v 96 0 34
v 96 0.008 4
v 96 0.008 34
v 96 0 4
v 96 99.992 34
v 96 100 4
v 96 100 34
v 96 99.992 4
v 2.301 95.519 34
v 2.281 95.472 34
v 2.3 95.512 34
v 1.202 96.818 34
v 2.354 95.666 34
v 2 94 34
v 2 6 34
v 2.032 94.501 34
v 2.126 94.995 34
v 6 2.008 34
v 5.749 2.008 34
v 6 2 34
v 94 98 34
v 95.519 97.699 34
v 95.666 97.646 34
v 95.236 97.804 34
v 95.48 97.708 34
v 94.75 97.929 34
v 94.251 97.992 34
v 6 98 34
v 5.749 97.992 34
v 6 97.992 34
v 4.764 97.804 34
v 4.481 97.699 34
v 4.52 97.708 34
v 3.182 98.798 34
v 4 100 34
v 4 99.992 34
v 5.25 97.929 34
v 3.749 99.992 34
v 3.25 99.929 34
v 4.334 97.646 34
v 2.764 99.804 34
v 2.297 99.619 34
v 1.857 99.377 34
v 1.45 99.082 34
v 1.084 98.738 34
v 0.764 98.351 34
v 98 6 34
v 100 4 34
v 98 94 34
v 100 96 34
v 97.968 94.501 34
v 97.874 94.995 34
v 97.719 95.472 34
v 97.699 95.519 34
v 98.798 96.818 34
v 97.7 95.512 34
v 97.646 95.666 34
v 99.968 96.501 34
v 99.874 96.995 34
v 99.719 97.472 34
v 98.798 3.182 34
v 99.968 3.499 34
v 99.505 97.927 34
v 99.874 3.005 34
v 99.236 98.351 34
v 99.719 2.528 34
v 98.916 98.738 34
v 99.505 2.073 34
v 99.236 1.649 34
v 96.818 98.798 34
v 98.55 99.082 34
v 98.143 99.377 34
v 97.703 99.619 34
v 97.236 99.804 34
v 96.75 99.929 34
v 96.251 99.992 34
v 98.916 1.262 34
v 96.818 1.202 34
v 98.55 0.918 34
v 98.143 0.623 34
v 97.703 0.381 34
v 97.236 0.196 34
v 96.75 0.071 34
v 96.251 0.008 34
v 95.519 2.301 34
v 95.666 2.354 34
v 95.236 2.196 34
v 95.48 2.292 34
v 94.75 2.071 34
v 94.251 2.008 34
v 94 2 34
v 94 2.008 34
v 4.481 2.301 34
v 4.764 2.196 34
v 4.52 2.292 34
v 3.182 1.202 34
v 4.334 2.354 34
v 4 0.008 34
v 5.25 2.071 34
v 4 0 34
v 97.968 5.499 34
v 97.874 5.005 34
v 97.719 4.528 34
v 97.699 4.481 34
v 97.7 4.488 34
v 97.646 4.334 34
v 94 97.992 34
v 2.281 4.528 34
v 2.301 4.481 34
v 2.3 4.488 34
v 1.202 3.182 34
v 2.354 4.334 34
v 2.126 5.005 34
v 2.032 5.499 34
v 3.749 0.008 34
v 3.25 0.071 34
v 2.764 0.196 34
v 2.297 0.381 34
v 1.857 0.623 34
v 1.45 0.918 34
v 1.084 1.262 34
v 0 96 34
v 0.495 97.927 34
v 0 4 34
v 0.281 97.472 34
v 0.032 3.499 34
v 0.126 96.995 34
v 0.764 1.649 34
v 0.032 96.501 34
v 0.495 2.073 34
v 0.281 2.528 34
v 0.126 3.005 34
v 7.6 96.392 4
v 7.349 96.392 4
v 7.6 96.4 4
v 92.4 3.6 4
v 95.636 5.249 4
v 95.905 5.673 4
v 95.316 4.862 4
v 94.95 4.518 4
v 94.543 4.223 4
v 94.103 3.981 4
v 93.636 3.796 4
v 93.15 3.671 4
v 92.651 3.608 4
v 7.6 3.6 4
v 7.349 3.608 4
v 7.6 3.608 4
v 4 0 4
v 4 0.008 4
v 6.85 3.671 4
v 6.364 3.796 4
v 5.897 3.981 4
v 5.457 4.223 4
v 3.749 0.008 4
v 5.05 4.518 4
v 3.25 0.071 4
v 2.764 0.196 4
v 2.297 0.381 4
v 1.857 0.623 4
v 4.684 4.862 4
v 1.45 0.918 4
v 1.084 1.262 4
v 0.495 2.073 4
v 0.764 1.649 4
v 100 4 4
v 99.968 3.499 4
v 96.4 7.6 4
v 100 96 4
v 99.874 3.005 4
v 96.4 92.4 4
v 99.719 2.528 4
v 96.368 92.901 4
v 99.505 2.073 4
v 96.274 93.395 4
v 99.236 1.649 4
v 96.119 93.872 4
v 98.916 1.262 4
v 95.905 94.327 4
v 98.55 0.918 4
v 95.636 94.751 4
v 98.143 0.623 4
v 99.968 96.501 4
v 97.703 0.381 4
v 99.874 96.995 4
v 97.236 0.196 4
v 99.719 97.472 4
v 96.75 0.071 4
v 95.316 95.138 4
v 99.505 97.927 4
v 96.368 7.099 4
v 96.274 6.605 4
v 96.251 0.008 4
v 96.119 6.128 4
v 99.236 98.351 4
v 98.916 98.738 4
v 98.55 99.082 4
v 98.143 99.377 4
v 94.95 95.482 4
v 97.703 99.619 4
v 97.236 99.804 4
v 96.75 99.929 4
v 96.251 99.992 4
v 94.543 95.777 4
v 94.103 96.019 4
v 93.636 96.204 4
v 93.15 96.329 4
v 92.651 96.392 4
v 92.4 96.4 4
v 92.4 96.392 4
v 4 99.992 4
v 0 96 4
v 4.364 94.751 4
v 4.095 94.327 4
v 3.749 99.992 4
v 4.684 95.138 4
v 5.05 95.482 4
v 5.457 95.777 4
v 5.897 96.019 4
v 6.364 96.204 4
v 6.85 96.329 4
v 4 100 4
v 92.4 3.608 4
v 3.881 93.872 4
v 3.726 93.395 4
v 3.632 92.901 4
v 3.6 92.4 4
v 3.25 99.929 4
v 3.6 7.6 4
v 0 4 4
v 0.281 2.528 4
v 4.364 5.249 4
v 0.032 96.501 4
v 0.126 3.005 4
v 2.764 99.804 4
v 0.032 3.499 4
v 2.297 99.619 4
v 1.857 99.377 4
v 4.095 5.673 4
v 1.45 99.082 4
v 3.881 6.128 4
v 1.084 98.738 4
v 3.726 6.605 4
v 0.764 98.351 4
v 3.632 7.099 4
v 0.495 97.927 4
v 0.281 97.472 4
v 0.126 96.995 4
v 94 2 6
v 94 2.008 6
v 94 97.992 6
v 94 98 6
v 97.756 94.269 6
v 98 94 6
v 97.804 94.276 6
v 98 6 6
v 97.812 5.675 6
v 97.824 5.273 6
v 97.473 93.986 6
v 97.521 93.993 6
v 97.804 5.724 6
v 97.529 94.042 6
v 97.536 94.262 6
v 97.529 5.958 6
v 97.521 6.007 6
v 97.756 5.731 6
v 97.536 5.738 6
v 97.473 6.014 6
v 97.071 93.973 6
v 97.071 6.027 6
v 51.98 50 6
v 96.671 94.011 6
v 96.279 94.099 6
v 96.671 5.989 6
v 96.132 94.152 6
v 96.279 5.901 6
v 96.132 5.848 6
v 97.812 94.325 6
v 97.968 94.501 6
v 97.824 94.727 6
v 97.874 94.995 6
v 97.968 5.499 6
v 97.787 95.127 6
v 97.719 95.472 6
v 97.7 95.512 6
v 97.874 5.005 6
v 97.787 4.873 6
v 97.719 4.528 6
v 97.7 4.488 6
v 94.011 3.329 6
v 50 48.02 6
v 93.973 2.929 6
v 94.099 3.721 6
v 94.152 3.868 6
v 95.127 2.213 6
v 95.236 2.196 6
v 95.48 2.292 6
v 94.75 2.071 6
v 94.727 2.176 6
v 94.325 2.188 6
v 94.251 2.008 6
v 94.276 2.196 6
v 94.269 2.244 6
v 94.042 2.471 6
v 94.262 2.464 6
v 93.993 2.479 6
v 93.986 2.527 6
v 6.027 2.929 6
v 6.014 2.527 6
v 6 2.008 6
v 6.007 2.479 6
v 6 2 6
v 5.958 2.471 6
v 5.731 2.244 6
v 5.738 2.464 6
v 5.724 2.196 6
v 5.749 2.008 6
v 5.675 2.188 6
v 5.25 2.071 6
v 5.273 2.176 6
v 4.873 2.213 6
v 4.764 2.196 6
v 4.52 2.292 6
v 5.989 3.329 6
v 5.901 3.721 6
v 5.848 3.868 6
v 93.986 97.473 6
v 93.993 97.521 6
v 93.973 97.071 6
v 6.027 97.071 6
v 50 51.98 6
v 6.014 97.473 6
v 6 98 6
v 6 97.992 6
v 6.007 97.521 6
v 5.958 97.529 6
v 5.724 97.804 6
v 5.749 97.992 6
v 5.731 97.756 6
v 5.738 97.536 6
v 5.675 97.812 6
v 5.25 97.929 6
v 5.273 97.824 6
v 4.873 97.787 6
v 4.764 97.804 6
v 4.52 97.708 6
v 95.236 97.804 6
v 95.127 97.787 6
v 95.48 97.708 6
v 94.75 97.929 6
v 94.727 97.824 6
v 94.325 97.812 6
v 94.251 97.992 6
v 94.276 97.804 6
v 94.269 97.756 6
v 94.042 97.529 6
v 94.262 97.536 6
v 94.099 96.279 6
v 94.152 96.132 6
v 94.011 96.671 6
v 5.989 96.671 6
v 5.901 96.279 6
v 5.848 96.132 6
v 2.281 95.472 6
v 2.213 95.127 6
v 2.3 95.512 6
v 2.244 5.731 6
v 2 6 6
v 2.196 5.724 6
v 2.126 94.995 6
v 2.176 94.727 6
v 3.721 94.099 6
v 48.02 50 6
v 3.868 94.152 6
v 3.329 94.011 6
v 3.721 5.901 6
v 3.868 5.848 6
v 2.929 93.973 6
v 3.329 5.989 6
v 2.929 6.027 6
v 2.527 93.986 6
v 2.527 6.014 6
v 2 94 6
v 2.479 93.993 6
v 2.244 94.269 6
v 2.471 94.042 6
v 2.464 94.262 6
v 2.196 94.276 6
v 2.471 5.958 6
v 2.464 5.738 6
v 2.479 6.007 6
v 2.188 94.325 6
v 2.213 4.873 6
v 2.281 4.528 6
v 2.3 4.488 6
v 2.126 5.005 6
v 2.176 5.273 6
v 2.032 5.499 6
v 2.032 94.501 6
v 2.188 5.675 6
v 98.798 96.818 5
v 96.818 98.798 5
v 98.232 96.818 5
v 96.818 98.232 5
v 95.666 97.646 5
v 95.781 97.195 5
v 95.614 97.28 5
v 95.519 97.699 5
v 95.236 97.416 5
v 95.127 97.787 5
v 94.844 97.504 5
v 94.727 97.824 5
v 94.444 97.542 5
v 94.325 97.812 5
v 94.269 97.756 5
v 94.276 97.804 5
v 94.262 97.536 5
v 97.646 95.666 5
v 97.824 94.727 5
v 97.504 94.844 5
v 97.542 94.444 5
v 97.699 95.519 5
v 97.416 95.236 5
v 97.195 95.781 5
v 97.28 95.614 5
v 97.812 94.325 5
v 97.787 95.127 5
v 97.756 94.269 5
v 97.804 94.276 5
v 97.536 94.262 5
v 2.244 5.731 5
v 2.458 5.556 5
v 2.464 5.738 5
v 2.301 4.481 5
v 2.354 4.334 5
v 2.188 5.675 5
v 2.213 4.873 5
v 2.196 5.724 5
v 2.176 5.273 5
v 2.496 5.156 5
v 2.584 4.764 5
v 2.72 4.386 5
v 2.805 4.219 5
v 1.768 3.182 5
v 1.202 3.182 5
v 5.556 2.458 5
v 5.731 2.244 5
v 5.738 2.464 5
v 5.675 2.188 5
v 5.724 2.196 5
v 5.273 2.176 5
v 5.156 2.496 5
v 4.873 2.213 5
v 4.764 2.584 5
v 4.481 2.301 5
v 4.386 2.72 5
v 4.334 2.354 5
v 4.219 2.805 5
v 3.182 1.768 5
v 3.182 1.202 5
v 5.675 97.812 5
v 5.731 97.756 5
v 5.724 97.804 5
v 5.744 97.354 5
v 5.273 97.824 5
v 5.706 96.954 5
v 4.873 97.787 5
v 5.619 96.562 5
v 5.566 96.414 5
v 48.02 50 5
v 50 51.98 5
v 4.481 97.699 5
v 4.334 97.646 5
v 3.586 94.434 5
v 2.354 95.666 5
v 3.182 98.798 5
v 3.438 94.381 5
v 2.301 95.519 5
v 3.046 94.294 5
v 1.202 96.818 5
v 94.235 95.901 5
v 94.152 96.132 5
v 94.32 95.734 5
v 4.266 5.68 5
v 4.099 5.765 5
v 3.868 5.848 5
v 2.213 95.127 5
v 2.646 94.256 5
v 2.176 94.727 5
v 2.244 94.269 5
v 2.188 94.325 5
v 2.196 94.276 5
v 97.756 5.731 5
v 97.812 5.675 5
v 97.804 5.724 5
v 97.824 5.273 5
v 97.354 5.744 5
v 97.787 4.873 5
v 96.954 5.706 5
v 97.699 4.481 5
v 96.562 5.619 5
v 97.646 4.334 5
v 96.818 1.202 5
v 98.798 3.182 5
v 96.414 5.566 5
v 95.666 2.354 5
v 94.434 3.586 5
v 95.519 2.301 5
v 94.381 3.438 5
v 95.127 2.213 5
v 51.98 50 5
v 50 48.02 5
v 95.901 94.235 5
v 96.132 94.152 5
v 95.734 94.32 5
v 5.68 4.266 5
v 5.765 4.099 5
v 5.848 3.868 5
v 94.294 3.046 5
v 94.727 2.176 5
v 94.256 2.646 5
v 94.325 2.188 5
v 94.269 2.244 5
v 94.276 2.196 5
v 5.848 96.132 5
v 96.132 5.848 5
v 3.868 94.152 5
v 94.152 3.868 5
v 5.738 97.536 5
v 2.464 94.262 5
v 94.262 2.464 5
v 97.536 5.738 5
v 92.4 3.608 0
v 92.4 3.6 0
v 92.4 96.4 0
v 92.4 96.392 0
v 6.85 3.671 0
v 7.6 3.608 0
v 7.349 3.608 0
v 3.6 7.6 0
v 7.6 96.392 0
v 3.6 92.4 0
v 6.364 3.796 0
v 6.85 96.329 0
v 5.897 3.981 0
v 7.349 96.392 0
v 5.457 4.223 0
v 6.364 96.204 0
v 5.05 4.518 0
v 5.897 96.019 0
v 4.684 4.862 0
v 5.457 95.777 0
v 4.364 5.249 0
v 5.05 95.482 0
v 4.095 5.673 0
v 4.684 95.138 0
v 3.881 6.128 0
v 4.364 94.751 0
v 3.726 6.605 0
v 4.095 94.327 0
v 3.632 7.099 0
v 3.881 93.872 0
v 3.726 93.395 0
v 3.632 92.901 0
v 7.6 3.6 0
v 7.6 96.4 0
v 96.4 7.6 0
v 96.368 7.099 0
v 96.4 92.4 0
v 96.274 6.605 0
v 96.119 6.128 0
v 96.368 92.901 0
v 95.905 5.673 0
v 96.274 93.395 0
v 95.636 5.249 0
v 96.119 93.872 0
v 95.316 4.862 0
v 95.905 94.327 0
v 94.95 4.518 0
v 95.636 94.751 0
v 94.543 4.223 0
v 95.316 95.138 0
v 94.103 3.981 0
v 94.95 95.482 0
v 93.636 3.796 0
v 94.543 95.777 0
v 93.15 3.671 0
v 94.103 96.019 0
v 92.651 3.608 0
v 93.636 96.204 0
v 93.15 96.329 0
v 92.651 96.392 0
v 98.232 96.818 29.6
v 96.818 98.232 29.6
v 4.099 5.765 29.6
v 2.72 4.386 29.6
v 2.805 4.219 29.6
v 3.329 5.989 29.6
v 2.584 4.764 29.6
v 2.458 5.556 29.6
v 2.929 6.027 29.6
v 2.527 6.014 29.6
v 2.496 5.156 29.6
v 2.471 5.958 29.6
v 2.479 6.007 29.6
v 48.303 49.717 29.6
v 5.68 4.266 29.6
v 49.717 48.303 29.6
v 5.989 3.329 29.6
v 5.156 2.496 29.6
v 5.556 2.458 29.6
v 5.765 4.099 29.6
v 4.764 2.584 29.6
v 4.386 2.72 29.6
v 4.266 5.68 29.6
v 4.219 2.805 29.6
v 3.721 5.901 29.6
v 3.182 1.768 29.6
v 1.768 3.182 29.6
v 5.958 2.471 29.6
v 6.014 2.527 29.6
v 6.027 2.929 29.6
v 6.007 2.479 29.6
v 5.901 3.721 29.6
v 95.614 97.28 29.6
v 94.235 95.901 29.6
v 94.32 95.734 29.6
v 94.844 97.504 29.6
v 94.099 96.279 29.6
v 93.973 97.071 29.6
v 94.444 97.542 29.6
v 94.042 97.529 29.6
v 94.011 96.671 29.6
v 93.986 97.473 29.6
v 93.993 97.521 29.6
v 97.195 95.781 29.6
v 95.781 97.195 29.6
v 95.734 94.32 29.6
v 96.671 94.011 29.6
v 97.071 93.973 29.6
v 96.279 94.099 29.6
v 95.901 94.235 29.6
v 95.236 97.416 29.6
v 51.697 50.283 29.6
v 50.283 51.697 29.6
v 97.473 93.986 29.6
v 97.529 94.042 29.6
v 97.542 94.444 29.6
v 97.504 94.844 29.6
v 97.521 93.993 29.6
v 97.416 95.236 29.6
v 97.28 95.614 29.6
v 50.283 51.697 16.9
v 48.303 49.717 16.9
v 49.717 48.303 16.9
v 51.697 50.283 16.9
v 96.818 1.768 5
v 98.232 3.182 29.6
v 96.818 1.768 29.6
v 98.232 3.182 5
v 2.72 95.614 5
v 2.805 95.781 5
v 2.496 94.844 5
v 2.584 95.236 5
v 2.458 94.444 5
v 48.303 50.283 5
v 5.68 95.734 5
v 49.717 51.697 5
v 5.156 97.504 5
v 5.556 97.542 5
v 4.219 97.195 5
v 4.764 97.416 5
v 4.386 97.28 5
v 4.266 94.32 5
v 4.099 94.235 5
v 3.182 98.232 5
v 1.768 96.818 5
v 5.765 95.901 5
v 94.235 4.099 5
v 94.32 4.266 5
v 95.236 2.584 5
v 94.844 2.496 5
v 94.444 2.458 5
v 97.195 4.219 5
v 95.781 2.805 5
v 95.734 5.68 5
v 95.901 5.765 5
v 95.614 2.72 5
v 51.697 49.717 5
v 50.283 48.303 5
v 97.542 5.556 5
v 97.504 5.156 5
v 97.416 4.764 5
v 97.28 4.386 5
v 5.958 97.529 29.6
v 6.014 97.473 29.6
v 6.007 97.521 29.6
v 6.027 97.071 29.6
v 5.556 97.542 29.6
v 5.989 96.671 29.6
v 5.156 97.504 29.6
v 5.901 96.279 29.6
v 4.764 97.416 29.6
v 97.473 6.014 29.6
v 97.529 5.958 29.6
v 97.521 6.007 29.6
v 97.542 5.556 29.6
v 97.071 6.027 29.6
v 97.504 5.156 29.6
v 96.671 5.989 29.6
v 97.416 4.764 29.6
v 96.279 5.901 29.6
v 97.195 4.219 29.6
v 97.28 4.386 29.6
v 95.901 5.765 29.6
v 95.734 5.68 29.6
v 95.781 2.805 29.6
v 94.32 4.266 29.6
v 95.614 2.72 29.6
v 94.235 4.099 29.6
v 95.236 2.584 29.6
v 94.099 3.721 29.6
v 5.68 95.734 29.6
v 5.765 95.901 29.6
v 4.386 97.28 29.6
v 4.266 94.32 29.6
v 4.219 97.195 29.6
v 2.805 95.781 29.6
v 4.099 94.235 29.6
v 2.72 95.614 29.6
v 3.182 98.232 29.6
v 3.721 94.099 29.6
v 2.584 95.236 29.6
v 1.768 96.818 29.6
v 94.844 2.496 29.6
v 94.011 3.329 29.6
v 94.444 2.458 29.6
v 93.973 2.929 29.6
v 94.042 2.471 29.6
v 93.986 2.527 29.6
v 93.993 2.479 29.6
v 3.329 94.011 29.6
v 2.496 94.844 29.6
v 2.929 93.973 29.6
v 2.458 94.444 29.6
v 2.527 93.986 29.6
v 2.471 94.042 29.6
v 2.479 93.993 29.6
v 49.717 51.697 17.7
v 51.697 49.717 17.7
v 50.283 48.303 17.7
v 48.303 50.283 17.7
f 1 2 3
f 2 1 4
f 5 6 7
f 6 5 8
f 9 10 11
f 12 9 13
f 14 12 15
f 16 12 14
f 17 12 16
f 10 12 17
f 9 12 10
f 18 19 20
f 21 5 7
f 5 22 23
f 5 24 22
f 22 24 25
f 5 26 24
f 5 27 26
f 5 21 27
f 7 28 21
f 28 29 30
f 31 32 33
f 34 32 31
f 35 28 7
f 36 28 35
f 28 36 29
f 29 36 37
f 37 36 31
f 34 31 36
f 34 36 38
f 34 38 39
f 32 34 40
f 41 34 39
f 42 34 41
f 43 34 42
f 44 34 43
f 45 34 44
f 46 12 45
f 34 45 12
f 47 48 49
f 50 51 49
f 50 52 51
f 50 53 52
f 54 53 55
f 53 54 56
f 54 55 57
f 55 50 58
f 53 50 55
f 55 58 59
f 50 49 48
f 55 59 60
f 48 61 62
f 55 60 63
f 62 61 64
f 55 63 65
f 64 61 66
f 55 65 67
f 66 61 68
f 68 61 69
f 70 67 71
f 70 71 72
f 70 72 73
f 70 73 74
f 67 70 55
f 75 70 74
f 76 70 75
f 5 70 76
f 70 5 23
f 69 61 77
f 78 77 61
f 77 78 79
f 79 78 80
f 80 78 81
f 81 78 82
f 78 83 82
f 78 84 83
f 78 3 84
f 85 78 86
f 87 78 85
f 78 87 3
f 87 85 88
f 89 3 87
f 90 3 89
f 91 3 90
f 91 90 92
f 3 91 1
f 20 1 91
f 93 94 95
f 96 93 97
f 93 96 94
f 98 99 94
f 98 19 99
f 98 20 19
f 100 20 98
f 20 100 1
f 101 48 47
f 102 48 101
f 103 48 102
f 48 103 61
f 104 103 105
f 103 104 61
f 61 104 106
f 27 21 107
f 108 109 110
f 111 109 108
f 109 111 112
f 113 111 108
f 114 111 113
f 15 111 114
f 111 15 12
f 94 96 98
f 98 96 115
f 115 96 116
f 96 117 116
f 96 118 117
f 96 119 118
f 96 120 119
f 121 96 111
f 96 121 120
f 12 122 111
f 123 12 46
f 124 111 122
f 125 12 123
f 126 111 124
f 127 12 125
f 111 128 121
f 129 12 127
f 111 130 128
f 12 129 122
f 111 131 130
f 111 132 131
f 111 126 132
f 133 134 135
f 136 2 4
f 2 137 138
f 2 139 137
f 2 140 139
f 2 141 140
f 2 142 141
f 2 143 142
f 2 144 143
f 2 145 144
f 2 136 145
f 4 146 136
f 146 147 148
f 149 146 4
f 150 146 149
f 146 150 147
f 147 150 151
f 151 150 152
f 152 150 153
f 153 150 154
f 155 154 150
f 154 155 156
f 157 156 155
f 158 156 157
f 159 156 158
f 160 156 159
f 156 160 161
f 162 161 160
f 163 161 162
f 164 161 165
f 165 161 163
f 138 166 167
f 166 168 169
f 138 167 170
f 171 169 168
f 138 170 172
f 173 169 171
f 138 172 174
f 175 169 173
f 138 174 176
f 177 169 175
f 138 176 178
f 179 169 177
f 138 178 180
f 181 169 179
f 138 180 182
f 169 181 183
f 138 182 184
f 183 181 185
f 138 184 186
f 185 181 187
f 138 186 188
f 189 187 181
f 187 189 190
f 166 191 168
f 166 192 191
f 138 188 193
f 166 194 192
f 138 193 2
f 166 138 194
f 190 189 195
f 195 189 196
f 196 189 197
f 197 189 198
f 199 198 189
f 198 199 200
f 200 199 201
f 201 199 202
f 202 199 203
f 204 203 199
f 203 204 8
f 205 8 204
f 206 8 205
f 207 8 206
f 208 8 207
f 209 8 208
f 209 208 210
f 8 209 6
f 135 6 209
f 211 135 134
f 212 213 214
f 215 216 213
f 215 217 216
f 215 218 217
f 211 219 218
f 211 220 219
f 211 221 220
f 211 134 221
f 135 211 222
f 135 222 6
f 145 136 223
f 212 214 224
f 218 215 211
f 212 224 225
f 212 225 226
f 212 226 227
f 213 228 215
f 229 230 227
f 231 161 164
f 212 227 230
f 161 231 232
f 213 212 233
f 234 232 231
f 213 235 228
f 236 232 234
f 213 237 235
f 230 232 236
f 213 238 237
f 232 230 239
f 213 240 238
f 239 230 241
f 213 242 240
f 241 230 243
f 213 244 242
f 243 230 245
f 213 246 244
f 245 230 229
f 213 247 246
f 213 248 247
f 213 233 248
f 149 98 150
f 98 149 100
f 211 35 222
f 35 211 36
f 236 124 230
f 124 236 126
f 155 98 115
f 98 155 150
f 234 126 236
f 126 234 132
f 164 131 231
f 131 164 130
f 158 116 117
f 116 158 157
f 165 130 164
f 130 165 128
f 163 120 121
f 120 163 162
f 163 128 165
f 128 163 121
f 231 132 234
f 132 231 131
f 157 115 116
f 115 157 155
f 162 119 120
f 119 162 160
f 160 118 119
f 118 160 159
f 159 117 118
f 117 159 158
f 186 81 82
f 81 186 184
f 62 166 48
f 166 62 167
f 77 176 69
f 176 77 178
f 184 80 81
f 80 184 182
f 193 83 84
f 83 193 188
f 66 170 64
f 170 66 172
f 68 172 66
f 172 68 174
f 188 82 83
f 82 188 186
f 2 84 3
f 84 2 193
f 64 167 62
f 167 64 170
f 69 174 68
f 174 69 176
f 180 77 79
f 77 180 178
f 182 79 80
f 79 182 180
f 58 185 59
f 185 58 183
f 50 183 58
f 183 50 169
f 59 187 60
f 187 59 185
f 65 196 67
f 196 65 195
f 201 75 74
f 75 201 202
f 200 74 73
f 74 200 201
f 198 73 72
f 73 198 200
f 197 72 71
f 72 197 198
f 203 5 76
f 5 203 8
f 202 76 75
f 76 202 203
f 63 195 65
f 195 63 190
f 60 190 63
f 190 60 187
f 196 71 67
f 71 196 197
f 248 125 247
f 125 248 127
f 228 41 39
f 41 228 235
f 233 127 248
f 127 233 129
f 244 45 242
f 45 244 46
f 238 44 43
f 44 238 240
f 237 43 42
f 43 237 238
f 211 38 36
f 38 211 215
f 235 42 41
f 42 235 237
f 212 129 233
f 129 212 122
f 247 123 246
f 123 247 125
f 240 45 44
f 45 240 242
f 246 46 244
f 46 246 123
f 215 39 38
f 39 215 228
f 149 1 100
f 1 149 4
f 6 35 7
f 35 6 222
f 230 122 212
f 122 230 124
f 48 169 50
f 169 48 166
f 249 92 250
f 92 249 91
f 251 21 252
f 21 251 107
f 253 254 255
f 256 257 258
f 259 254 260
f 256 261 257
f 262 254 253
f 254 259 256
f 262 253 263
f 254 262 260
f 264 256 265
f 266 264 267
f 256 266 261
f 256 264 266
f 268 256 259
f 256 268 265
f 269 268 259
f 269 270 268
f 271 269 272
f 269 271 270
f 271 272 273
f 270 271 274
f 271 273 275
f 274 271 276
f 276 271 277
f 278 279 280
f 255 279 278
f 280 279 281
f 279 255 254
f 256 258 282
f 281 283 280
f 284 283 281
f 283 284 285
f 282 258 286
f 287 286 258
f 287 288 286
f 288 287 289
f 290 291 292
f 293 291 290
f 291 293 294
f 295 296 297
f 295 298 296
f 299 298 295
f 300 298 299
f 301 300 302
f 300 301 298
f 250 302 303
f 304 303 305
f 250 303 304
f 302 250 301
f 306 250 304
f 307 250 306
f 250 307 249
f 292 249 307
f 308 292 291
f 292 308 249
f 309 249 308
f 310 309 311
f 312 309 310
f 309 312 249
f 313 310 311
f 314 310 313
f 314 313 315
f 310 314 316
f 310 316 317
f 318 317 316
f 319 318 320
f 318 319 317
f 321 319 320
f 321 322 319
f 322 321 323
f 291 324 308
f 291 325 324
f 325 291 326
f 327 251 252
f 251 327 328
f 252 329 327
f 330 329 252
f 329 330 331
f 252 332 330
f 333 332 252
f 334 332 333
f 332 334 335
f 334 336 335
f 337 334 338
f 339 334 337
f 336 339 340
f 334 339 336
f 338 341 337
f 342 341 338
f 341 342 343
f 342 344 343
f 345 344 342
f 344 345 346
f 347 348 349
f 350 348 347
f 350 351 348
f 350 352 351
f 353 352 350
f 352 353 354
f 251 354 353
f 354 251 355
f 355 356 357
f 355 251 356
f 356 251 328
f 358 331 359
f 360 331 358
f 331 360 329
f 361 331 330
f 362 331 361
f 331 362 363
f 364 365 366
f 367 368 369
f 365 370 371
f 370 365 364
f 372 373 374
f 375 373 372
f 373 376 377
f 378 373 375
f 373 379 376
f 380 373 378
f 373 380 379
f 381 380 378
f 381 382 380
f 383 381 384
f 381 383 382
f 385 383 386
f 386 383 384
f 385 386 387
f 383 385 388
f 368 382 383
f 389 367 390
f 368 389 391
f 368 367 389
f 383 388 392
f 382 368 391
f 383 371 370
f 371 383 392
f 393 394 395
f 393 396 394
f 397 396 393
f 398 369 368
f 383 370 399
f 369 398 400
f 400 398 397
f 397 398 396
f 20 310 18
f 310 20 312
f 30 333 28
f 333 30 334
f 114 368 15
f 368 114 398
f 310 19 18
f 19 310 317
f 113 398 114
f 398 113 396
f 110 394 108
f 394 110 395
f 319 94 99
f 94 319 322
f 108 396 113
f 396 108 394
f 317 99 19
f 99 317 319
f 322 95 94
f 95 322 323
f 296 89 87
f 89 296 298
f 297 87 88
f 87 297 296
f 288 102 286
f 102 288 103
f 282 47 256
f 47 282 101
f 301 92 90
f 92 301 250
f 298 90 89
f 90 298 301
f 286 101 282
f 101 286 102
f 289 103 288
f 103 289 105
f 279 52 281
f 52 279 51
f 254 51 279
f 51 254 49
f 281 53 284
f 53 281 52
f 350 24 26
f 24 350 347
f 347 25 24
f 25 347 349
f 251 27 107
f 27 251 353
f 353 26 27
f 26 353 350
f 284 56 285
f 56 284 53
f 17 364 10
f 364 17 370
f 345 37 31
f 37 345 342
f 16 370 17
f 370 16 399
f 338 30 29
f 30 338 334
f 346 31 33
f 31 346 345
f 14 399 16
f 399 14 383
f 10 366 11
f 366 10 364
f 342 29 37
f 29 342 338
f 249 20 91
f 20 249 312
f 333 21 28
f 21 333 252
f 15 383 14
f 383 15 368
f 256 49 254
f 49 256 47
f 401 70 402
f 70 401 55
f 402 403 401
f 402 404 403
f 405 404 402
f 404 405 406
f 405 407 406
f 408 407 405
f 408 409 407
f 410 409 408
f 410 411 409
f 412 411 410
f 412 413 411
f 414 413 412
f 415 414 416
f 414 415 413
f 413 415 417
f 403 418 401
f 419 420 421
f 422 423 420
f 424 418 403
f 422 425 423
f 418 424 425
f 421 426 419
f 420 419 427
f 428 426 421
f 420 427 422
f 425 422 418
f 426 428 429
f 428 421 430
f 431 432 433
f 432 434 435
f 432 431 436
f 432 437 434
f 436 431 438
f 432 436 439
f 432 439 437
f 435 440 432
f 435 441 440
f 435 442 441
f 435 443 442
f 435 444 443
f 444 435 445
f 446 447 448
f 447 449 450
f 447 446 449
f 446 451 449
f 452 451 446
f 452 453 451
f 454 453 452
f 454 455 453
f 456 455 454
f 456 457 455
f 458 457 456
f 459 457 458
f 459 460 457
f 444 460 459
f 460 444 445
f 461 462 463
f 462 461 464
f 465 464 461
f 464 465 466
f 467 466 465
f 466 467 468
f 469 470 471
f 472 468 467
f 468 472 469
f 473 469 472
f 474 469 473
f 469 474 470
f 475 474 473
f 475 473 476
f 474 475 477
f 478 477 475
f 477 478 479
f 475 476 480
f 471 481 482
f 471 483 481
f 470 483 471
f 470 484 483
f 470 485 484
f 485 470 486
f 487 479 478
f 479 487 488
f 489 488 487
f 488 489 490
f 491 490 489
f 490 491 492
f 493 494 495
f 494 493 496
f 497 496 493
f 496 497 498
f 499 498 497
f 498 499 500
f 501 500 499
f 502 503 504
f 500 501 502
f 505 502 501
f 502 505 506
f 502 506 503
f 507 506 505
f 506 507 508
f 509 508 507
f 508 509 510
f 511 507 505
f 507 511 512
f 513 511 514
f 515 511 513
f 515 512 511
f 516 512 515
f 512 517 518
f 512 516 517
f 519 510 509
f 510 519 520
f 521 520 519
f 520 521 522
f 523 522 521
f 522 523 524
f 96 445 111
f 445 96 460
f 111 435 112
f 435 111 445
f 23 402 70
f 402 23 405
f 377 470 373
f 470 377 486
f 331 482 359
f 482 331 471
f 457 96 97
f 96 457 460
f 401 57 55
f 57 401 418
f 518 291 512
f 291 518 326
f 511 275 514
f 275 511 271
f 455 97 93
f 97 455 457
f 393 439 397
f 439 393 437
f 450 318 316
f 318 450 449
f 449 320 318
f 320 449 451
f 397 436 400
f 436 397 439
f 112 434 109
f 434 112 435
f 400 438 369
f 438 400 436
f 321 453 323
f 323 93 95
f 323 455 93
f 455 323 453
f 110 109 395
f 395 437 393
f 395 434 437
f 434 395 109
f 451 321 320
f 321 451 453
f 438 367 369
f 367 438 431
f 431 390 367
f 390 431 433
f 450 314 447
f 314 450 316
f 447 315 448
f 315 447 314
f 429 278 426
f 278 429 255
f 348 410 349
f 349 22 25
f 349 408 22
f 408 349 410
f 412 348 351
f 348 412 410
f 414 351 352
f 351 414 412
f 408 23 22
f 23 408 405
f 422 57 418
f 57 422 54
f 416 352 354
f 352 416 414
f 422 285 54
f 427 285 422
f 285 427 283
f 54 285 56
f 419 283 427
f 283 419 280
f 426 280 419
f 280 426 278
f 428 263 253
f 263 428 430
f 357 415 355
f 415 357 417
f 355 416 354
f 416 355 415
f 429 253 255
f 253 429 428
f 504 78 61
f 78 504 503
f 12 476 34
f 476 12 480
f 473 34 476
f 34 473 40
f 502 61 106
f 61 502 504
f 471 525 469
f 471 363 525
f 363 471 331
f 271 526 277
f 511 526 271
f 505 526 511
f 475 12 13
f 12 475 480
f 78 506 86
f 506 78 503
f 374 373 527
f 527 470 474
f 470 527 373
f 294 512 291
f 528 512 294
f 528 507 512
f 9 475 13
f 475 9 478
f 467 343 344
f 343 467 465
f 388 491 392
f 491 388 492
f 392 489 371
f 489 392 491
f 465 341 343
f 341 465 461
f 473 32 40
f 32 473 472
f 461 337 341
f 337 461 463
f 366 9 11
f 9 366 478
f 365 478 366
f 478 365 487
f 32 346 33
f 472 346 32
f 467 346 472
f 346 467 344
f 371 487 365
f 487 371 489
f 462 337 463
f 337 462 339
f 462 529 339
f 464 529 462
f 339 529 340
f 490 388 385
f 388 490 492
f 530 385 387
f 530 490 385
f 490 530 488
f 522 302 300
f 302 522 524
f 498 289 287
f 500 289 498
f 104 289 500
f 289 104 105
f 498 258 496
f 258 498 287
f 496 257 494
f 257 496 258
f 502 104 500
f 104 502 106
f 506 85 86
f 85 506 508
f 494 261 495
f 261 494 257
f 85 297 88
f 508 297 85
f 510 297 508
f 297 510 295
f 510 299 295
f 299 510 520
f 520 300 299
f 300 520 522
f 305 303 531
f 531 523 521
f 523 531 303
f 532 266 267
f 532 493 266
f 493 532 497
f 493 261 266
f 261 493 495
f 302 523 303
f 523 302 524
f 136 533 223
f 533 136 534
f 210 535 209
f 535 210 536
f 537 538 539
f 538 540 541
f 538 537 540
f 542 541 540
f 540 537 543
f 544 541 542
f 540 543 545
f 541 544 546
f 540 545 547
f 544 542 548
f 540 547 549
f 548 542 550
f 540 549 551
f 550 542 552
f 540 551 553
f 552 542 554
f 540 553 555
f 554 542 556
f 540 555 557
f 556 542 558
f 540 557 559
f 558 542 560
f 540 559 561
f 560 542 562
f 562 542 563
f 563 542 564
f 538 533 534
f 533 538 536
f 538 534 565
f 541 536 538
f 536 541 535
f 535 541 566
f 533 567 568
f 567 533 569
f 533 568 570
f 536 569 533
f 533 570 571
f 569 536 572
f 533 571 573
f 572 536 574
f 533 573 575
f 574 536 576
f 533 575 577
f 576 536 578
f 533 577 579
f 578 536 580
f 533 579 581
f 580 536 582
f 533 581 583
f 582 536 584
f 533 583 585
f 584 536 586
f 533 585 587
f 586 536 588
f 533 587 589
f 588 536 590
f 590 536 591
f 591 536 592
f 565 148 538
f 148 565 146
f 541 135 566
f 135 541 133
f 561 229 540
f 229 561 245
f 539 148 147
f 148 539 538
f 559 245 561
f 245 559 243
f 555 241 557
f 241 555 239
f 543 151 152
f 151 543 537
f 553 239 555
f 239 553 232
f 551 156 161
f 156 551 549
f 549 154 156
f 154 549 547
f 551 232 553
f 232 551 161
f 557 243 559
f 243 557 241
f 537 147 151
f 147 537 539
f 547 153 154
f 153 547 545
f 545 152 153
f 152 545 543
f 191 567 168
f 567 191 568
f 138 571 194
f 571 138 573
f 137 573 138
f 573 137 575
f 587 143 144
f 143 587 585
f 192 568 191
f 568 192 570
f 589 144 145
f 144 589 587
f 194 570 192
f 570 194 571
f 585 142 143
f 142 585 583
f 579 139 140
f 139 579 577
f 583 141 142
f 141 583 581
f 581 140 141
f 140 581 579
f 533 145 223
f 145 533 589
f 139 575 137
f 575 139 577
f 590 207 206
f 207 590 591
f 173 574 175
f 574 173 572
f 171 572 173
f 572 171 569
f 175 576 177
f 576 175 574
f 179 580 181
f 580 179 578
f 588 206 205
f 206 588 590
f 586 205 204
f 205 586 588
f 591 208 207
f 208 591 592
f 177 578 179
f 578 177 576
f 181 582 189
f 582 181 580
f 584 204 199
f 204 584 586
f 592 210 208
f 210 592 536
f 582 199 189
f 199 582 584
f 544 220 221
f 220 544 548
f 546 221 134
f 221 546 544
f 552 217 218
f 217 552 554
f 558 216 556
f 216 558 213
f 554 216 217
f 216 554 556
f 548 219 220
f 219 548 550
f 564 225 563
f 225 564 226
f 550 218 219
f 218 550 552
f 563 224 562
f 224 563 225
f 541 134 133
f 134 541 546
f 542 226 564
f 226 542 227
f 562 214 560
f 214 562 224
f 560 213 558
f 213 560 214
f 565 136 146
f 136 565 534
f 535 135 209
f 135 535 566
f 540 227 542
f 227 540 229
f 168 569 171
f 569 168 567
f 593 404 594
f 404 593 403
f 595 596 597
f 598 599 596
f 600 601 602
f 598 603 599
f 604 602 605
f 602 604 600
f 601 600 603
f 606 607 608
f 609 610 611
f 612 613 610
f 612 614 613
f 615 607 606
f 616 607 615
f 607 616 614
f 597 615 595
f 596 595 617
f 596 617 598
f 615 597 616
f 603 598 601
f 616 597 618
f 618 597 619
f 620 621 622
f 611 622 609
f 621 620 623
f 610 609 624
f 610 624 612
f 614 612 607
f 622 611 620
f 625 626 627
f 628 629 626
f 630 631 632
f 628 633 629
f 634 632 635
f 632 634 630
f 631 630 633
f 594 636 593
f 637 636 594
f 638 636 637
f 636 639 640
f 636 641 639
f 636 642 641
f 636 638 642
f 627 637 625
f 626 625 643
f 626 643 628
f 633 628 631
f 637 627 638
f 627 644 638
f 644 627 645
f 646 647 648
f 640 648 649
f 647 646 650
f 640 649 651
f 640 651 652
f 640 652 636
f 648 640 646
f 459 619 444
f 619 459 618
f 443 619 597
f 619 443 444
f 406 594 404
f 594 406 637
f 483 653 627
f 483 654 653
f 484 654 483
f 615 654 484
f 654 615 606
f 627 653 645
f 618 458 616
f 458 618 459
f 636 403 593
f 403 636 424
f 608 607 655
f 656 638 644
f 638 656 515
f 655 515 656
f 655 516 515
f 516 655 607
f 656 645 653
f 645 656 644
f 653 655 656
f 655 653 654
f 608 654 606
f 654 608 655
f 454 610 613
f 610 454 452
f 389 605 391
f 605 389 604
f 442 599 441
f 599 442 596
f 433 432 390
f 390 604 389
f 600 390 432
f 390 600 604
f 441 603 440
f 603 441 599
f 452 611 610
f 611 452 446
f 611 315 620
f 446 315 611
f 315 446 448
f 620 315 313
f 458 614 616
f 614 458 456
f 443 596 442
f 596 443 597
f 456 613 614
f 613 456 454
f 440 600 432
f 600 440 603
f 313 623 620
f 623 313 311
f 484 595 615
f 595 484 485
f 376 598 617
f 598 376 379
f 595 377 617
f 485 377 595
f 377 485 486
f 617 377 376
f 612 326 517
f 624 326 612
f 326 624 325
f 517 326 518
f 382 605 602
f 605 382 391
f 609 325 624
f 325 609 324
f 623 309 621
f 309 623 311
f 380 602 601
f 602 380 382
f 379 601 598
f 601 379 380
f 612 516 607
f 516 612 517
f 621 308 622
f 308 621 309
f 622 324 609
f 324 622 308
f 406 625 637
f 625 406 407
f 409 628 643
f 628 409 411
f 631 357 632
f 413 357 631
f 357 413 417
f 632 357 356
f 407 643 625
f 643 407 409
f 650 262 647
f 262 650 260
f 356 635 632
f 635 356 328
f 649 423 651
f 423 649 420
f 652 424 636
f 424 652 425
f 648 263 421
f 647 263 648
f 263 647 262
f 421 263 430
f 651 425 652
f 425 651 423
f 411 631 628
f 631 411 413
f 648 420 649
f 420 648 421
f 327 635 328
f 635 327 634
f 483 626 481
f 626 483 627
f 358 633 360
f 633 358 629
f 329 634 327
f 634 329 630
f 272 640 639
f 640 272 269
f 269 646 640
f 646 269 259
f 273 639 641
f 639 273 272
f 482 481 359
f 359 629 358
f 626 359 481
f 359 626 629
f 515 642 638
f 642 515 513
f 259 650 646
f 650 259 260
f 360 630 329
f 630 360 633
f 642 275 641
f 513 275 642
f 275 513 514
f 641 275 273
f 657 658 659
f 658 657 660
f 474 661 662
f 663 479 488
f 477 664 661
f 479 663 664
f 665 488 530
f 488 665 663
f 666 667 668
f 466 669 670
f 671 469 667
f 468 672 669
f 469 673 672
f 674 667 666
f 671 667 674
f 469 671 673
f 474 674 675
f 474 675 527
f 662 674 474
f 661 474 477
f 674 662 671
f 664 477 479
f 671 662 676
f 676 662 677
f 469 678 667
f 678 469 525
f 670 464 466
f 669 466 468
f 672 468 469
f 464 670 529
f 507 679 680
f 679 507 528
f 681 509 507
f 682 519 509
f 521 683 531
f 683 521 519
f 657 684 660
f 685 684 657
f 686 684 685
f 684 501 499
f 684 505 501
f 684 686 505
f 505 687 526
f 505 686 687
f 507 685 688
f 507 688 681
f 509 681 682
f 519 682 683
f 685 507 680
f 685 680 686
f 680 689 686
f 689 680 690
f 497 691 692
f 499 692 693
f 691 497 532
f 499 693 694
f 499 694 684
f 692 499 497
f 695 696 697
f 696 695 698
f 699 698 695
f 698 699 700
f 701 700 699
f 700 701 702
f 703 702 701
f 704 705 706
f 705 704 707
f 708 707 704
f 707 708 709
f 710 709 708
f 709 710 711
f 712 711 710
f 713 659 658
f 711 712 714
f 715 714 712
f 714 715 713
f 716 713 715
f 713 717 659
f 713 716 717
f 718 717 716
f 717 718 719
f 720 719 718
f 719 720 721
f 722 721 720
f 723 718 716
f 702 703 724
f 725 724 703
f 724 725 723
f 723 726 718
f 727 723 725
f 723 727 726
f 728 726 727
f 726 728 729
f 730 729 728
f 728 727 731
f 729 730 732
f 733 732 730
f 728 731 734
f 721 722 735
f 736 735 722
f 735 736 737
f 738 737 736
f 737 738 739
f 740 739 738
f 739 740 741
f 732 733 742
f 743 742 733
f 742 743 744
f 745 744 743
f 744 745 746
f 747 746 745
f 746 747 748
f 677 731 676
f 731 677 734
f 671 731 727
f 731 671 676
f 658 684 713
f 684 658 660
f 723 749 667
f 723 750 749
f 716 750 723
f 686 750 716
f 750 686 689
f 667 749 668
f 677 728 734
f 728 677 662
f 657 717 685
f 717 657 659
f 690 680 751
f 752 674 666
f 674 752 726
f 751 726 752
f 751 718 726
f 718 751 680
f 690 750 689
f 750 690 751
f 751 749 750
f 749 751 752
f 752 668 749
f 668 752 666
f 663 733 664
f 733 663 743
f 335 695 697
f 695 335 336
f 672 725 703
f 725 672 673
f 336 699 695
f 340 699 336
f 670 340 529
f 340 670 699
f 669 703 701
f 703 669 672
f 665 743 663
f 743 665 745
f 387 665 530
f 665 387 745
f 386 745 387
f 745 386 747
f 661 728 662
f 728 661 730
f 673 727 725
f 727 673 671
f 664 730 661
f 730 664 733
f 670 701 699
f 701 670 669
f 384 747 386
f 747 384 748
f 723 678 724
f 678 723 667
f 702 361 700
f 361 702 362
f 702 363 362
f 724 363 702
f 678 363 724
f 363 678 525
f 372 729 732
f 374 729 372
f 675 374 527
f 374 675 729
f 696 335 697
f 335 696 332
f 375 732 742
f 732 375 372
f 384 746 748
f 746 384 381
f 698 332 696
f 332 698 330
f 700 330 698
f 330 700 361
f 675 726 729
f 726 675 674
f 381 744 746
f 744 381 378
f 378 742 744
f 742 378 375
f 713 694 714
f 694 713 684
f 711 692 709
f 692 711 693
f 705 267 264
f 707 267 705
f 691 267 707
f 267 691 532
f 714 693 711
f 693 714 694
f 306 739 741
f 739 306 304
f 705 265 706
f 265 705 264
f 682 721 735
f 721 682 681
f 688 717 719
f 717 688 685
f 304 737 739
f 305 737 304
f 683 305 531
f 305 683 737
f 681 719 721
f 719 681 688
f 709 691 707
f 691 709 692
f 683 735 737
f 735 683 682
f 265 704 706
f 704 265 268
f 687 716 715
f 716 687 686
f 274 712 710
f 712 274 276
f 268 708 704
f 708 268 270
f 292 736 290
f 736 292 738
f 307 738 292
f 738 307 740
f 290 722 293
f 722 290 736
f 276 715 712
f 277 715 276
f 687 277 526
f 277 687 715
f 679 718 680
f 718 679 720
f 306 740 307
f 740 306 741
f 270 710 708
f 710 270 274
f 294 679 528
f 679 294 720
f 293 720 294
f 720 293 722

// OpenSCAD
// file: token-organizer-separator-module.scad
module renderSeparator(x, y, z, r, s) {
  union() {
    difference() {
      translate([0, 0, z / 2]) cube([x - r * 1.75, y, z], center=true);
      translate([0, 0, z - z / 4]) cube([y + s * 2, y + s * 2, z / 2 + s * 2], center=true);
    }

    for (i = [-1:1]) {
      if (i != 0) {
        intersection() {
          translate([i * (x - r * 4) / 2, 0, z / 2]) cylinder(r=r - s * 2, h=z, center=true);
          translate([i * (x - r * 2) / 2, 0, z / 2]) cylinder(r=r - s * 2, h=z, center=true);
        }
      }
    }
  }
}
// file: token-organizer-box-module.scad
include <token-organizer-separator-module.scad>

module renderBox(x, y, z, r, t, i, s) {
  translate([0, 0, i]) {
    difference() {
      renderBase(x, y, z, r);
      translate([r / 2, r / 2, r / 2]) renderBase(x - r, y - r, z, r);
      translate([x / 2, y / 2, r / 2 - r / 4]) rotate([0, 0, 45]) renderSeparator(sqrt(x * x + y * y) + s * 2, t + s * 2, z - r / 2 + r / 4, r, s);
      translate([x / 2, y / 2, r / 2 - r / 4]) rotate([0, 0, 315]) renderSeparator(sqrt(x * x + y * y) + s * 2, t + s * 2, z - r / 2 + r / 4, r, s);
    }

    translate([r - s, r - s, -i]) renderBase(x - (r - s) * 2, y - (r - s) * 2, i, r);
  }
}

module renderBase(x, y, z, r) {
  union() {
    translate([r, r, 0]) cube([x - r * 2, y - r * 2, z]);

    translate([r, r, 0]) cylinder(r=r, h=z);
    translate([x - r, r, 0]) cylinder(r=r, h=z);
    translate([x - r, y - r, 0]) cylinder(r=r, h=z);
    translate([r, y - r, 0]) cylinder(r=r, h=z);

    translate([r, 0, 0]) cube([x - r * 2, r, z]);
    translate([r, y - r, 0]) cube([x - r * 2, r, z]);
    translate([0, r, 0]) cube([r, y - r * 2, z]);
    translate([x - r, r, 0]) cube([r, y - r * 2, z]);
  }
}
// main file
include <token-organizer-box-module.scad>
include <token-organizer-separator-module.scad>
$fn = 50;

sizeX = 100;
sizeY = 100;
sizeZ = 30;
spacing = .4;
thickness = 2;
radius = 4;
inset = 4;

renderBox(sizeX, sizeY, sizeZ, radius, thickness, inset, spacing);
translate([sizeX / 2, sizeY / 2, inset + radius / 2 - radius / 4]) rotate([0, 0, 45]) renderSeparator(sqrt(sizeX * sizeX + sizeY * sizeY), thickness, sizeZ - inset - spacing - radius / 2 + radius / 4, radius, spacing);
translate([sizeX / 2, sizeY / 2, sizeZ - spacing]) rotate([0, 0, 315]) scale([1, 1, -1]) renderSeparator(sqrt(sizeX * sizeX + sizeY * sizeY), thickness, sizeZ - inset - spacing - radius / 2 + radius / 4, radius, spacing);
